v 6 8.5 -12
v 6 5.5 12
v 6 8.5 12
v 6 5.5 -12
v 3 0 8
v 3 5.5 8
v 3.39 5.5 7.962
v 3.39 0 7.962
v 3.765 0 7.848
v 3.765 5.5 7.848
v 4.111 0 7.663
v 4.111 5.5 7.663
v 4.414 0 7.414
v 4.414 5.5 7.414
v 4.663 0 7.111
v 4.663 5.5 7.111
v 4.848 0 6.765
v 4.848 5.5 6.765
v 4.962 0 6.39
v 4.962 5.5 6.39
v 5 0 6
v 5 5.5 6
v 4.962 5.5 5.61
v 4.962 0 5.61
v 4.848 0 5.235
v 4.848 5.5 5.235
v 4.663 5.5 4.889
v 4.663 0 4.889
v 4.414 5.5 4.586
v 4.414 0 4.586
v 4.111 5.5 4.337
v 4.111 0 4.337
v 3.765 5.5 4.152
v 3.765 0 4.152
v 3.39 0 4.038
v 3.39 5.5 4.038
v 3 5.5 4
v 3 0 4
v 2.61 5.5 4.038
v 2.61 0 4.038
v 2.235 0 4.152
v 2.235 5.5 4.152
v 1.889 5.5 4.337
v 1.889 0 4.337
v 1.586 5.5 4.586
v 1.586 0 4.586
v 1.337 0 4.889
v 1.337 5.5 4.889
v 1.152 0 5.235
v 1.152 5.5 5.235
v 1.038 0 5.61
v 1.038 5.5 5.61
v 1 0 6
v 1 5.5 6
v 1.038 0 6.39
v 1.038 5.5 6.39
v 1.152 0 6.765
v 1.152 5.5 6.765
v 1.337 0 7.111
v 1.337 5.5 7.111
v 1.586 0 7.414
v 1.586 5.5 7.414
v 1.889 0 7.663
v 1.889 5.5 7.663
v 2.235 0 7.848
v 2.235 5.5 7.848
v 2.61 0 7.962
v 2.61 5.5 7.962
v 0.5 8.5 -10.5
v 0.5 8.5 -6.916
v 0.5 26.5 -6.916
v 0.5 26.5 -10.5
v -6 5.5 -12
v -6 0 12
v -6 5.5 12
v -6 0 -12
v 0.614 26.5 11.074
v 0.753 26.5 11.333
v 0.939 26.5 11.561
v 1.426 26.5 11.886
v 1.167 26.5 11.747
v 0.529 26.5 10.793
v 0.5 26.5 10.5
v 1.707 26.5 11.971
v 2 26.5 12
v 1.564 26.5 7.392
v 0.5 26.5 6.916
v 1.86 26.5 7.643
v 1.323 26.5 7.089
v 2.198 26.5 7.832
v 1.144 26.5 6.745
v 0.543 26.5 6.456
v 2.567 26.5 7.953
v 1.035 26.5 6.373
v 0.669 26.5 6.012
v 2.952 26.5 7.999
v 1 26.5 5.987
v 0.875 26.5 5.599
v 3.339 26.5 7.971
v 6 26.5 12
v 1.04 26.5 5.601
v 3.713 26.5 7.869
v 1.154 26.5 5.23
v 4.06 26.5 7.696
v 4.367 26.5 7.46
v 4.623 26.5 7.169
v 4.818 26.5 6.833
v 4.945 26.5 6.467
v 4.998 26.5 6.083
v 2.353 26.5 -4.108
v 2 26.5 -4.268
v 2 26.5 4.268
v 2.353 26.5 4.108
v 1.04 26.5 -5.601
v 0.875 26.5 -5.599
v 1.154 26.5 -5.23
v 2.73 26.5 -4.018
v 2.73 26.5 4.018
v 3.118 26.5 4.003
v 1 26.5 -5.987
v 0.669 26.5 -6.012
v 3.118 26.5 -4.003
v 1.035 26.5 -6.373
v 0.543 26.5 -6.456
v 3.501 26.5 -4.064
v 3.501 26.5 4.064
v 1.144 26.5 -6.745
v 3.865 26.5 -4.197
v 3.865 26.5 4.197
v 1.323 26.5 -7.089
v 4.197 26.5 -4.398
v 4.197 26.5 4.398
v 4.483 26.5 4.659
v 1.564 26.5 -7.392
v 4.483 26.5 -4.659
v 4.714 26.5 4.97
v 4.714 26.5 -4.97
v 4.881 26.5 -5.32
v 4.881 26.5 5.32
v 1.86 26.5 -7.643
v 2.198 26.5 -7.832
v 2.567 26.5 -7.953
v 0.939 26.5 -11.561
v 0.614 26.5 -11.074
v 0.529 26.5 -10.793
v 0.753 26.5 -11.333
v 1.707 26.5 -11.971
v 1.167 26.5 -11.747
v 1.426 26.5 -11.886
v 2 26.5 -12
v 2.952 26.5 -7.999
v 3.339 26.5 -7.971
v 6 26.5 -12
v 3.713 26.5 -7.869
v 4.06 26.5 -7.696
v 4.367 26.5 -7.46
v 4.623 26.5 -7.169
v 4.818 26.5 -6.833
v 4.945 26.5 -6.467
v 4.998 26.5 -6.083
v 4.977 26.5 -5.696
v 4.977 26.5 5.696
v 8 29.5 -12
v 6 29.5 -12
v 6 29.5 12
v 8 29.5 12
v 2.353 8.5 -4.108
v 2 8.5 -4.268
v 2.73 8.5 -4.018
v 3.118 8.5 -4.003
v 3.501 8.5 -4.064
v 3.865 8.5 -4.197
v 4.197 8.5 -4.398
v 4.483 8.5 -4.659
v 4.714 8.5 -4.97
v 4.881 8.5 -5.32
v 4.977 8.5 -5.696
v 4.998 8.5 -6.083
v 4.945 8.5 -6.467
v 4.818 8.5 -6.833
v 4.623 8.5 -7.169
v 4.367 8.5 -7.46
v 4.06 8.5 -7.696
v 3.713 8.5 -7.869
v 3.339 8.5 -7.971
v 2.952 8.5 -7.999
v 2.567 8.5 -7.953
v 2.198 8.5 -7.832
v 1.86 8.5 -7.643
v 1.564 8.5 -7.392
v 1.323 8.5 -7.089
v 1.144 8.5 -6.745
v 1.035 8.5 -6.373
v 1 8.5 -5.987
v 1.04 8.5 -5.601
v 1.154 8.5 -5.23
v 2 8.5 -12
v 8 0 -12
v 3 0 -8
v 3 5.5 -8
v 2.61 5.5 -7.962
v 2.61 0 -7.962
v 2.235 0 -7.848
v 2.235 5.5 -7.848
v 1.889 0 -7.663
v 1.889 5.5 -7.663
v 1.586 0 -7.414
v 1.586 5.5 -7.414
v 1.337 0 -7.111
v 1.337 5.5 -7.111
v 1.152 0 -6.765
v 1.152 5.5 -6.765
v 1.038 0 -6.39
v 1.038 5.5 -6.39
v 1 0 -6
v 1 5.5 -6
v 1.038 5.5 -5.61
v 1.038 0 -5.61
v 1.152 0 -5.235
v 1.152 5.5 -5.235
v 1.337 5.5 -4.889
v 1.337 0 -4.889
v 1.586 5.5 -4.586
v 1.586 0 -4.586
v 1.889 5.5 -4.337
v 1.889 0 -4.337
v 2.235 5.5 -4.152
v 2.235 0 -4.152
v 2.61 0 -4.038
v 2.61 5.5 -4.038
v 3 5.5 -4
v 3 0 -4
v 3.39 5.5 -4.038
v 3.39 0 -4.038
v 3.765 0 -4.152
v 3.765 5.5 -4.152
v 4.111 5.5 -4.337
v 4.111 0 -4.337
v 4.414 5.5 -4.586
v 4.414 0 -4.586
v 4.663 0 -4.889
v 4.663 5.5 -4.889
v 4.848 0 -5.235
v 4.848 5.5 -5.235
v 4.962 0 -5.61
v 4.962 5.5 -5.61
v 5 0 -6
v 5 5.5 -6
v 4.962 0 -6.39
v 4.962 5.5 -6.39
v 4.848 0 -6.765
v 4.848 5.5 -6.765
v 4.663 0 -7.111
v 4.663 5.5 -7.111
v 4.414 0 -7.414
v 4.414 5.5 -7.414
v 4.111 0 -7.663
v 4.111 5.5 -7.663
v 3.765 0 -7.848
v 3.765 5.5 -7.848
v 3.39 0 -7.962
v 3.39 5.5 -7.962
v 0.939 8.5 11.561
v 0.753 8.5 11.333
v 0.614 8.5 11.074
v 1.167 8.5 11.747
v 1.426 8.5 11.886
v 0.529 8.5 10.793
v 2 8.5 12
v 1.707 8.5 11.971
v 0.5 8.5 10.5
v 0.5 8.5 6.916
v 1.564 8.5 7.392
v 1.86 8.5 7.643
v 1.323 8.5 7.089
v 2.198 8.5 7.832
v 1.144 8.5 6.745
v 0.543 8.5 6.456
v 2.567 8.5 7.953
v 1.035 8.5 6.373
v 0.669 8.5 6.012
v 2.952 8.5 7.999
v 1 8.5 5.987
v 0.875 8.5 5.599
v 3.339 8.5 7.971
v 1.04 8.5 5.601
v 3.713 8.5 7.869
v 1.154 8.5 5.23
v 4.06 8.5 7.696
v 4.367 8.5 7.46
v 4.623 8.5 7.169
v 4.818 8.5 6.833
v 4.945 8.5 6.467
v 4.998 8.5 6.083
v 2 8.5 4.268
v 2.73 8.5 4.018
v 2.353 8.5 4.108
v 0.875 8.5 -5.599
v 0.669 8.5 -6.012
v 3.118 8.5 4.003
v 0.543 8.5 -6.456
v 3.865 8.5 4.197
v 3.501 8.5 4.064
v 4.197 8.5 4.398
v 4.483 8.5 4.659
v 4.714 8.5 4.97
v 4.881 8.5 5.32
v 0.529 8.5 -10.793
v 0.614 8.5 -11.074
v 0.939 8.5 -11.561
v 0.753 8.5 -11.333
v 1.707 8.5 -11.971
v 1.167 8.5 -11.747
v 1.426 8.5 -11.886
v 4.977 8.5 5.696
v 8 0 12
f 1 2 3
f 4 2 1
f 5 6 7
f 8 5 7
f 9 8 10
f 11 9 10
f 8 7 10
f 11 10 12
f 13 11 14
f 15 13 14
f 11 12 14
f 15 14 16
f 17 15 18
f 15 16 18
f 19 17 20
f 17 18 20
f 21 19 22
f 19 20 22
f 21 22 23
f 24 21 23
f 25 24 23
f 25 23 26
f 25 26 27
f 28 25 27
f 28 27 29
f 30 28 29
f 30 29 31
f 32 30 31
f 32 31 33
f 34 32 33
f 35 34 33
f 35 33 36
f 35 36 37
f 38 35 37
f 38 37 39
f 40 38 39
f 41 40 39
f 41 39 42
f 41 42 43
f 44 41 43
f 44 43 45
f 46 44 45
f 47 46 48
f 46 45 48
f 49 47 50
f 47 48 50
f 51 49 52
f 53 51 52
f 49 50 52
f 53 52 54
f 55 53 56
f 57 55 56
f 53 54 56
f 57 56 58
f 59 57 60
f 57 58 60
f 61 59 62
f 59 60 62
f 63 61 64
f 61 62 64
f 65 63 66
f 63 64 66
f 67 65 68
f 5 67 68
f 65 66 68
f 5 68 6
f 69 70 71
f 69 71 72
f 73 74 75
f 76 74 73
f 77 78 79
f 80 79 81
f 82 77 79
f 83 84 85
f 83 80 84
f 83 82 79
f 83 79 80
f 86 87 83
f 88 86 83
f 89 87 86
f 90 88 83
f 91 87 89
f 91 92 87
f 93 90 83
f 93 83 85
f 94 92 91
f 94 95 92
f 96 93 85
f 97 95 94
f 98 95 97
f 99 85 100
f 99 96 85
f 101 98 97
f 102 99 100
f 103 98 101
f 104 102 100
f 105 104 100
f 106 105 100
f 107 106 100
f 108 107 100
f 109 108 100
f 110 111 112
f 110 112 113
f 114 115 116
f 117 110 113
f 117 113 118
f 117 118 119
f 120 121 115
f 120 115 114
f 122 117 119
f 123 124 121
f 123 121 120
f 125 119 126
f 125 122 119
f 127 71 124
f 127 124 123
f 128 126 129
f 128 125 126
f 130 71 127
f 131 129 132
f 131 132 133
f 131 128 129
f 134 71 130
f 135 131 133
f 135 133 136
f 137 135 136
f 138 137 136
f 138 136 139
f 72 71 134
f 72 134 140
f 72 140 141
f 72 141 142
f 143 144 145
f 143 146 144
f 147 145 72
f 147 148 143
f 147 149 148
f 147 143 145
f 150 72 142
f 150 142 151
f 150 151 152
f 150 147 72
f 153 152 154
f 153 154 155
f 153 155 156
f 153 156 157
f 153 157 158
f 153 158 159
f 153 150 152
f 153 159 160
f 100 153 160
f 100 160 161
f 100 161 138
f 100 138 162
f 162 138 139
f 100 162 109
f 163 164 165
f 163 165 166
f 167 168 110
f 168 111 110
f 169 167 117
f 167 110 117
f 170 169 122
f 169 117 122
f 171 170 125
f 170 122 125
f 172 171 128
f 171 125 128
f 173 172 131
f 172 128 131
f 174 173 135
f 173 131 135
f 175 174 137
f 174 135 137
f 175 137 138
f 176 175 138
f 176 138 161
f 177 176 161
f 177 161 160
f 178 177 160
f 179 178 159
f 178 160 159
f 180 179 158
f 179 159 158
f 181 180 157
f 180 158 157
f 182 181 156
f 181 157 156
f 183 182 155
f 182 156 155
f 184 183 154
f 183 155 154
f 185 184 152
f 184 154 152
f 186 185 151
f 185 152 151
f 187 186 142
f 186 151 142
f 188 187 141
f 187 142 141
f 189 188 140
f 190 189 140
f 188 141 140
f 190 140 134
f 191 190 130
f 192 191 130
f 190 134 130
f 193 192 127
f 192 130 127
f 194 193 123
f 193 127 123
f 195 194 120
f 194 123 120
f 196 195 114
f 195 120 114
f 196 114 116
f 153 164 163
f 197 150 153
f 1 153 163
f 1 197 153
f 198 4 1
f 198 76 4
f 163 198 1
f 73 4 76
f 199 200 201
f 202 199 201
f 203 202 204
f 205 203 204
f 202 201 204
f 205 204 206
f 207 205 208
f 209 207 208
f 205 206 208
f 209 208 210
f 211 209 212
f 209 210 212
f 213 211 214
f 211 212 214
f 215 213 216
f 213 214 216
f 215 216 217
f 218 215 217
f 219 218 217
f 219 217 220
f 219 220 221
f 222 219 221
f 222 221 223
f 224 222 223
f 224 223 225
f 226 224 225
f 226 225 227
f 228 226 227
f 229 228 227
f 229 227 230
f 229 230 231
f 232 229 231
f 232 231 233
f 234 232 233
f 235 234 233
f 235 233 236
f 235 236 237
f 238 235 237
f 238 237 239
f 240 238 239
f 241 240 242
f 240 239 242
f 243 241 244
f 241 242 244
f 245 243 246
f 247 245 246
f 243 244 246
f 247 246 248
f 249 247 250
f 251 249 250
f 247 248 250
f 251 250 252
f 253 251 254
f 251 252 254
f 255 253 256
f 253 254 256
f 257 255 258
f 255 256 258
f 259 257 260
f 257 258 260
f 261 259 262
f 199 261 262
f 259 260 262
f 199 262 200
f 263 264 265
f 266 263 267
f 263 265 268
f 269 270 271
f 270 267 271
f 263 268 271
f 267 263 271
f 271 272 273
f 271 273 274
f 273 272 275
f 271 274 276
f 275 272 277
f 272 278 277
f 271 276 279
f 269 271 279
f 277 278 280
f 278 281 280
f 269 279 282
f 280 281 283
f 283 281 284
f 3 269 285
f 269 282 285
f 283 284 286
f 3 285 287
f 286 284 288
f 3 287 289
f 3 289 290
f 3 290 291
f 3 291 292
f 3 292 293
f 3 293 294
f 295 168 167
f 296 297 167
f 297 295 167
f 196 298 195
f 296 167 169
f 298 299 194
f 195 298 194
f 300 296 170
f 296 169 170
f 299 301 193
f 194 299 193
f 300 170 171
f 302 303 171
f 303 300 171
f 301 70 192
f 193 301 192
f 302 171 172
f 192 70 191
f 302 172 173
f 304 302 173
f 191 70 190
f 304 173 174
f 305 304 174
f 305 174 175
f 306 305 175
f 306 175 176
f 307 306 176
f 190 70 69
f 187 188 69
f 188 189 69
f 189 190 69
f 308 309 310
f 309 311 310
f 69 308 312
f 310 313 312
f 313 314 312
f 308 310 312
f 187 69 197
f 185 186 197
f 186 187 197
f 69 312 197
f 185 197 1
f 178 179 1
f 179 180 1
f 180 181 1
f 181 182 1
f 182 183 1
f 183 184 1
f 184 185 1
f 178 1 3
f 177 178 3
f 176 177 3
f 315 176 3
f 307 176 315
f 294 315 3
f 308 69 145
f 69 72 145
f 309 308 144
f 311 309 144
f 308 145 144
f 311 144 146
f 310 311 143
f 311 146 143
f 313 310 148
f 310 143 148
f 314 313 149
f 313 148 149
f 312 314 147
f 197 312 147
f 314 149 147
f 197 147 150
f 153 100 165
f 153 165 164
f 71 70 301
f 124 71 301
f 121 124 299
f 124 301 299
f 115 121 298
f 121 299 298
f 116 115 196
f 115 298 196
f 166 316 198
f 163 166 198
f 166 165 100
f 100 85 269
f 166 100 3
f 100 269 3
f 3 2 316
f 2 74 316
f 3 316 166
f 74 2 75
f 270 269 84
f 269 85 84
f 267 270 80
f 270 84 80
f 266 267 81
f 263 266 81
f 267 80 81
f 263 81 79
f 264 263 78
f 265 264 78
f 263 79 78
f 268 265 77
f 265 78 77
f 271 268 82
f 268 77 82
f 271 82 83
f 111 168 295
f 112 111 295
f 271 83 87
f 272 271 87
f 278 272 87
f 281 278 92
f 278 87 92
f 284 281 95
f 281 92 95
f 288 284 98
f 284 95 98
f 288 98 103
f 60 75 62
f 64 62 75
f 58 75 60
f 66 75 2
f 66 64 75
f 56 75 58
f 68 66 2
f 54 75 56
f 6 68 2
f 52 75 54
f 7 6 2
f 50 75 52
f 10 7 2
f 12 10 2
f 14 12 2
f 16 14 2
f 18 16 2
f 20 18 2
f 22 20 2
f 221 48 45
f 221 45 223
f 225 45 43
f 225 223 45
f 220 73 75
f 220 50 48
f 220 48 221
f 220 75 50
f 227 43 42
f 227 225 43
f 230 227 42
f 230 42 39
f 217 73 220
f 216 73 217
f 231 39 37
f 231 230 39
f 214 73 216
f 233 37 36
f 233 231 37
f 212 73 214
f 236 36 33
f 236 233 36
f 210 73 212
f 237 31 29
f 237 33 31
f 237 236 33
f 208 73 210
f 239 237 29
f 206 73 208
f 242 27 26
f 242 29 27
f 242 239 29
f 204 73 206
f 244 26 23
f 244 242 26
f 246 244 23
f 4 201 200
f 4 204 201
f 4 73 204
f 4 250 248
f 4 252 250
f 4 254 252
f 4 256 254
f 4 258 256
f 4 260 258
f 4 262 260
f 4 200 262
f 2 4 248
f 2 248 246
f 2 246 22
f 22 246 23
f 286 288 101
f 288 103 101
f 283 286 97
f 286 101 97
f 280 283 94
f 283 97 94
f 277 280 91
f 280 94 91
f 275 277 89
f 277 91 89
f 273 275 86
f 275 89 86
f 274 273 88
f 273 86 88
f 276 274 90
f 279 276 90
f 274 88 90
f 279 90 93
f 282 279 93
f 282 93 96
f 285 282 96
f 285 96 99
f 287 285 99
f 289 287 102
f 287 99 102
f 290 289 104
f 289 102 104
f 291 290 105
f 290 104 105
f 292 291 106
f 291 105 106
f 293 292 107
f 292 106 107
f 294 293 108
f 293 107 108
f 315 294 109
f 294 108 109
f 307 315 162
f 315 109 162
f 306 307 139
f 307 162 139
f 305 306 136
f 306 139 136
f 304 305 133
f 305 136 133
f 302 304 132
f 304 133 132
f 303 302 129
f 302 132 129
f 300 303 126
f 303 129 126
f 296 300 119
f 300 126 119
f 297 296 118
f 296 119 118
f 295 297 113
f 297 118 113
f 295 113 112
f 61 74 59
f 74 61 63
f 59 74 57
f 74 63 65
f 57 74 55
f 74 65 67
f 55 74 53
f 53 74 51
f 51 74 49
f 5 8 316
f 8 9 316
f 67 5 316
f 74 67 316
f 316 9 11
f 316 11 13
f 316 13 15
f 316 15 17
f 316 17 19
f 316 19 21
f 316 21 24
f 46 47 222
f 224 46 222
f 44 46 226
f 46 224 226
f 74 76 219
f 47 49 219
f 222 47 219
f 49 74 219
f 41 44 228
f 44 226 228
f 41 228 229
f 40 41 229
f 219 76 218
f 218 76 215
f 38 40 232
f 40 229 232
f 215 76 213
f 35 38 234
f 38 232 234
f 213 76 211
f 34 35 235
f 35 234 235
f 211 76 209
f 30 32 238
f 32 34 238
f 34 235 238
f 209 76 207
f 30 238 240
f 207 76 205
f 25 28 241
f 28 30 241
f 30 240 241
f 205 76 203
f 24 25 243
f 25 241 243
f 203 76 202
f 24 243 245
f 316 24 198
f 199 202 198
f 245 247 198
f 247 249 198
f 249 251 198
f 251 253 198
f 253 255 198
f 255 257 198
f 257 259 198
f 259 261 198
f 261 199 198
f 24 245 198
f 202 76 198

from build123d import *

# Parameters (mm, degrees)
SKETCH1_W           = 12
SKETCH1_H           = 24
BOSS_EXTRUDE1_DEPTH = 5.5
SKETCH2_W           = 2
SKETCH2_H           = 24
BOSS_EXTRUDE2_DEPTH = 29.5
BOSS_EXTRUDE4_START = 3
SKETCH4_W           = 5.5
SKETCH4_H           = 24
BOSS_EXTRUDE4_DEPTH = 18
SKETCH5_W           = 9.25
SKETCH5_H           = 18
CUT_EXTRUDE1_DEPTH  = 1.5
FILLET1_R           = 2.5
SKETCH6_R           = 2
CUT_EXTRUDE2_DEPTH  = 31.170349683
FILLET2_R           = 1.5


with BuildPart() as part:
    # Sketch1 → Boss-Extrude1 (new body)
    with BuildSketch(Plane(origin=(0, 0, 0), x_dir=(1, 0, 0), z_dir=(0, 1, 0))):
        Rectangle(SKETCH1_W, SKETCH1_H)
    extrude(amount=BOSS_EXTRUDE1_DEPTH)

    # Sketch2 → Boss-Extrude2 (add)
    with BuildSketch(Plane(origin=(0, 0, 0), x_dir=(1, 0, 0), z_dir=(0, 1, 0))):
        with Locations((7, 0)):
            Rectangle(SKETCH2_W, SKETCH2_H)
    extrude(amount=BOSS_EXTRUDE2_DEPTH)

    # Sketch4 → Boss-Extrude4 (add)
    with BuildSketch(Plane(origin=(0, 5.5, 0), x_dir=(1, 0, 0), z_dir=(0, 1, 0)).offset(BOSS_EXTRUDE4_START)):
        with Locations((3.25, 0)):
            Rectangle(SKETCH4_W, SKETCH4_H)
    extrude(amount=BOSS_EXTRUDE4_DEPTH)

    # Sketch5 → Cut-Extrude1 (cut)
    with BuildSketch(Plane.ZY.offset(-0.5)):
        with Locations((0, 17.5)):
            Rectangle(SKETCH5_W, SKETCH5_H)
    extrude(amount=-CUT_EXTRUDE1_DEPTH, mode=Mode.SUBTRACT)

    # Fillet1
    # the kernel refuses this fillet: 2.5 mm, written as the material it takes off along each edge
    with BuildSketch(Plane(origin=(0.5, 32.228219619, 4.625), x_dir=(0, 0, 1), z_dir=(0, -1, 0)), Plane(origin=(0.5, 8.5, -4.625), x_dir=(0, 0, -1), z_dir=(0, 1, 0))) as fillet1_piece_1:
        with BuildLine():
            CenterArc((2.291287847, -2.5), FILLET1_R, 90, 66.421821522)
            Line((0, -1.5), (0, 0))
            Line((0, 0), (2.291287847, 0))
        make_face()
    extrude(amount=23.728219619, mode=Mode.SUBTRACT)

    # Sketch6 → Cut-Extrude2 (cut, through all)
    with BuildSketch(Plane(origin=(0, 26.5, 0), x_dir=(1, 0, 0), z_dir=(0, 1, 0))):
        with Locations(Location((3, -6, 0), (0, 0, 270))):
            Circle(SKETCH6_R)
        with Locations(Location((3, 6, 0), (0, 0, 90))):
            Circle(SKETCH6_R)
    extrude(amount=-CUT_EXTRUDE2_DEPTH, mode=Mode.SUBTRACT)

    # Fillet2
    fillet2_edges = [part.edges().sort_by_distance(p)[0] for p in [
        (0.5, 17.5, -12),
        (0.5, 17.5, 12),
    ]]
    fillet(fillet2_edges, radius=FILLET2_R)


solid = part.part
